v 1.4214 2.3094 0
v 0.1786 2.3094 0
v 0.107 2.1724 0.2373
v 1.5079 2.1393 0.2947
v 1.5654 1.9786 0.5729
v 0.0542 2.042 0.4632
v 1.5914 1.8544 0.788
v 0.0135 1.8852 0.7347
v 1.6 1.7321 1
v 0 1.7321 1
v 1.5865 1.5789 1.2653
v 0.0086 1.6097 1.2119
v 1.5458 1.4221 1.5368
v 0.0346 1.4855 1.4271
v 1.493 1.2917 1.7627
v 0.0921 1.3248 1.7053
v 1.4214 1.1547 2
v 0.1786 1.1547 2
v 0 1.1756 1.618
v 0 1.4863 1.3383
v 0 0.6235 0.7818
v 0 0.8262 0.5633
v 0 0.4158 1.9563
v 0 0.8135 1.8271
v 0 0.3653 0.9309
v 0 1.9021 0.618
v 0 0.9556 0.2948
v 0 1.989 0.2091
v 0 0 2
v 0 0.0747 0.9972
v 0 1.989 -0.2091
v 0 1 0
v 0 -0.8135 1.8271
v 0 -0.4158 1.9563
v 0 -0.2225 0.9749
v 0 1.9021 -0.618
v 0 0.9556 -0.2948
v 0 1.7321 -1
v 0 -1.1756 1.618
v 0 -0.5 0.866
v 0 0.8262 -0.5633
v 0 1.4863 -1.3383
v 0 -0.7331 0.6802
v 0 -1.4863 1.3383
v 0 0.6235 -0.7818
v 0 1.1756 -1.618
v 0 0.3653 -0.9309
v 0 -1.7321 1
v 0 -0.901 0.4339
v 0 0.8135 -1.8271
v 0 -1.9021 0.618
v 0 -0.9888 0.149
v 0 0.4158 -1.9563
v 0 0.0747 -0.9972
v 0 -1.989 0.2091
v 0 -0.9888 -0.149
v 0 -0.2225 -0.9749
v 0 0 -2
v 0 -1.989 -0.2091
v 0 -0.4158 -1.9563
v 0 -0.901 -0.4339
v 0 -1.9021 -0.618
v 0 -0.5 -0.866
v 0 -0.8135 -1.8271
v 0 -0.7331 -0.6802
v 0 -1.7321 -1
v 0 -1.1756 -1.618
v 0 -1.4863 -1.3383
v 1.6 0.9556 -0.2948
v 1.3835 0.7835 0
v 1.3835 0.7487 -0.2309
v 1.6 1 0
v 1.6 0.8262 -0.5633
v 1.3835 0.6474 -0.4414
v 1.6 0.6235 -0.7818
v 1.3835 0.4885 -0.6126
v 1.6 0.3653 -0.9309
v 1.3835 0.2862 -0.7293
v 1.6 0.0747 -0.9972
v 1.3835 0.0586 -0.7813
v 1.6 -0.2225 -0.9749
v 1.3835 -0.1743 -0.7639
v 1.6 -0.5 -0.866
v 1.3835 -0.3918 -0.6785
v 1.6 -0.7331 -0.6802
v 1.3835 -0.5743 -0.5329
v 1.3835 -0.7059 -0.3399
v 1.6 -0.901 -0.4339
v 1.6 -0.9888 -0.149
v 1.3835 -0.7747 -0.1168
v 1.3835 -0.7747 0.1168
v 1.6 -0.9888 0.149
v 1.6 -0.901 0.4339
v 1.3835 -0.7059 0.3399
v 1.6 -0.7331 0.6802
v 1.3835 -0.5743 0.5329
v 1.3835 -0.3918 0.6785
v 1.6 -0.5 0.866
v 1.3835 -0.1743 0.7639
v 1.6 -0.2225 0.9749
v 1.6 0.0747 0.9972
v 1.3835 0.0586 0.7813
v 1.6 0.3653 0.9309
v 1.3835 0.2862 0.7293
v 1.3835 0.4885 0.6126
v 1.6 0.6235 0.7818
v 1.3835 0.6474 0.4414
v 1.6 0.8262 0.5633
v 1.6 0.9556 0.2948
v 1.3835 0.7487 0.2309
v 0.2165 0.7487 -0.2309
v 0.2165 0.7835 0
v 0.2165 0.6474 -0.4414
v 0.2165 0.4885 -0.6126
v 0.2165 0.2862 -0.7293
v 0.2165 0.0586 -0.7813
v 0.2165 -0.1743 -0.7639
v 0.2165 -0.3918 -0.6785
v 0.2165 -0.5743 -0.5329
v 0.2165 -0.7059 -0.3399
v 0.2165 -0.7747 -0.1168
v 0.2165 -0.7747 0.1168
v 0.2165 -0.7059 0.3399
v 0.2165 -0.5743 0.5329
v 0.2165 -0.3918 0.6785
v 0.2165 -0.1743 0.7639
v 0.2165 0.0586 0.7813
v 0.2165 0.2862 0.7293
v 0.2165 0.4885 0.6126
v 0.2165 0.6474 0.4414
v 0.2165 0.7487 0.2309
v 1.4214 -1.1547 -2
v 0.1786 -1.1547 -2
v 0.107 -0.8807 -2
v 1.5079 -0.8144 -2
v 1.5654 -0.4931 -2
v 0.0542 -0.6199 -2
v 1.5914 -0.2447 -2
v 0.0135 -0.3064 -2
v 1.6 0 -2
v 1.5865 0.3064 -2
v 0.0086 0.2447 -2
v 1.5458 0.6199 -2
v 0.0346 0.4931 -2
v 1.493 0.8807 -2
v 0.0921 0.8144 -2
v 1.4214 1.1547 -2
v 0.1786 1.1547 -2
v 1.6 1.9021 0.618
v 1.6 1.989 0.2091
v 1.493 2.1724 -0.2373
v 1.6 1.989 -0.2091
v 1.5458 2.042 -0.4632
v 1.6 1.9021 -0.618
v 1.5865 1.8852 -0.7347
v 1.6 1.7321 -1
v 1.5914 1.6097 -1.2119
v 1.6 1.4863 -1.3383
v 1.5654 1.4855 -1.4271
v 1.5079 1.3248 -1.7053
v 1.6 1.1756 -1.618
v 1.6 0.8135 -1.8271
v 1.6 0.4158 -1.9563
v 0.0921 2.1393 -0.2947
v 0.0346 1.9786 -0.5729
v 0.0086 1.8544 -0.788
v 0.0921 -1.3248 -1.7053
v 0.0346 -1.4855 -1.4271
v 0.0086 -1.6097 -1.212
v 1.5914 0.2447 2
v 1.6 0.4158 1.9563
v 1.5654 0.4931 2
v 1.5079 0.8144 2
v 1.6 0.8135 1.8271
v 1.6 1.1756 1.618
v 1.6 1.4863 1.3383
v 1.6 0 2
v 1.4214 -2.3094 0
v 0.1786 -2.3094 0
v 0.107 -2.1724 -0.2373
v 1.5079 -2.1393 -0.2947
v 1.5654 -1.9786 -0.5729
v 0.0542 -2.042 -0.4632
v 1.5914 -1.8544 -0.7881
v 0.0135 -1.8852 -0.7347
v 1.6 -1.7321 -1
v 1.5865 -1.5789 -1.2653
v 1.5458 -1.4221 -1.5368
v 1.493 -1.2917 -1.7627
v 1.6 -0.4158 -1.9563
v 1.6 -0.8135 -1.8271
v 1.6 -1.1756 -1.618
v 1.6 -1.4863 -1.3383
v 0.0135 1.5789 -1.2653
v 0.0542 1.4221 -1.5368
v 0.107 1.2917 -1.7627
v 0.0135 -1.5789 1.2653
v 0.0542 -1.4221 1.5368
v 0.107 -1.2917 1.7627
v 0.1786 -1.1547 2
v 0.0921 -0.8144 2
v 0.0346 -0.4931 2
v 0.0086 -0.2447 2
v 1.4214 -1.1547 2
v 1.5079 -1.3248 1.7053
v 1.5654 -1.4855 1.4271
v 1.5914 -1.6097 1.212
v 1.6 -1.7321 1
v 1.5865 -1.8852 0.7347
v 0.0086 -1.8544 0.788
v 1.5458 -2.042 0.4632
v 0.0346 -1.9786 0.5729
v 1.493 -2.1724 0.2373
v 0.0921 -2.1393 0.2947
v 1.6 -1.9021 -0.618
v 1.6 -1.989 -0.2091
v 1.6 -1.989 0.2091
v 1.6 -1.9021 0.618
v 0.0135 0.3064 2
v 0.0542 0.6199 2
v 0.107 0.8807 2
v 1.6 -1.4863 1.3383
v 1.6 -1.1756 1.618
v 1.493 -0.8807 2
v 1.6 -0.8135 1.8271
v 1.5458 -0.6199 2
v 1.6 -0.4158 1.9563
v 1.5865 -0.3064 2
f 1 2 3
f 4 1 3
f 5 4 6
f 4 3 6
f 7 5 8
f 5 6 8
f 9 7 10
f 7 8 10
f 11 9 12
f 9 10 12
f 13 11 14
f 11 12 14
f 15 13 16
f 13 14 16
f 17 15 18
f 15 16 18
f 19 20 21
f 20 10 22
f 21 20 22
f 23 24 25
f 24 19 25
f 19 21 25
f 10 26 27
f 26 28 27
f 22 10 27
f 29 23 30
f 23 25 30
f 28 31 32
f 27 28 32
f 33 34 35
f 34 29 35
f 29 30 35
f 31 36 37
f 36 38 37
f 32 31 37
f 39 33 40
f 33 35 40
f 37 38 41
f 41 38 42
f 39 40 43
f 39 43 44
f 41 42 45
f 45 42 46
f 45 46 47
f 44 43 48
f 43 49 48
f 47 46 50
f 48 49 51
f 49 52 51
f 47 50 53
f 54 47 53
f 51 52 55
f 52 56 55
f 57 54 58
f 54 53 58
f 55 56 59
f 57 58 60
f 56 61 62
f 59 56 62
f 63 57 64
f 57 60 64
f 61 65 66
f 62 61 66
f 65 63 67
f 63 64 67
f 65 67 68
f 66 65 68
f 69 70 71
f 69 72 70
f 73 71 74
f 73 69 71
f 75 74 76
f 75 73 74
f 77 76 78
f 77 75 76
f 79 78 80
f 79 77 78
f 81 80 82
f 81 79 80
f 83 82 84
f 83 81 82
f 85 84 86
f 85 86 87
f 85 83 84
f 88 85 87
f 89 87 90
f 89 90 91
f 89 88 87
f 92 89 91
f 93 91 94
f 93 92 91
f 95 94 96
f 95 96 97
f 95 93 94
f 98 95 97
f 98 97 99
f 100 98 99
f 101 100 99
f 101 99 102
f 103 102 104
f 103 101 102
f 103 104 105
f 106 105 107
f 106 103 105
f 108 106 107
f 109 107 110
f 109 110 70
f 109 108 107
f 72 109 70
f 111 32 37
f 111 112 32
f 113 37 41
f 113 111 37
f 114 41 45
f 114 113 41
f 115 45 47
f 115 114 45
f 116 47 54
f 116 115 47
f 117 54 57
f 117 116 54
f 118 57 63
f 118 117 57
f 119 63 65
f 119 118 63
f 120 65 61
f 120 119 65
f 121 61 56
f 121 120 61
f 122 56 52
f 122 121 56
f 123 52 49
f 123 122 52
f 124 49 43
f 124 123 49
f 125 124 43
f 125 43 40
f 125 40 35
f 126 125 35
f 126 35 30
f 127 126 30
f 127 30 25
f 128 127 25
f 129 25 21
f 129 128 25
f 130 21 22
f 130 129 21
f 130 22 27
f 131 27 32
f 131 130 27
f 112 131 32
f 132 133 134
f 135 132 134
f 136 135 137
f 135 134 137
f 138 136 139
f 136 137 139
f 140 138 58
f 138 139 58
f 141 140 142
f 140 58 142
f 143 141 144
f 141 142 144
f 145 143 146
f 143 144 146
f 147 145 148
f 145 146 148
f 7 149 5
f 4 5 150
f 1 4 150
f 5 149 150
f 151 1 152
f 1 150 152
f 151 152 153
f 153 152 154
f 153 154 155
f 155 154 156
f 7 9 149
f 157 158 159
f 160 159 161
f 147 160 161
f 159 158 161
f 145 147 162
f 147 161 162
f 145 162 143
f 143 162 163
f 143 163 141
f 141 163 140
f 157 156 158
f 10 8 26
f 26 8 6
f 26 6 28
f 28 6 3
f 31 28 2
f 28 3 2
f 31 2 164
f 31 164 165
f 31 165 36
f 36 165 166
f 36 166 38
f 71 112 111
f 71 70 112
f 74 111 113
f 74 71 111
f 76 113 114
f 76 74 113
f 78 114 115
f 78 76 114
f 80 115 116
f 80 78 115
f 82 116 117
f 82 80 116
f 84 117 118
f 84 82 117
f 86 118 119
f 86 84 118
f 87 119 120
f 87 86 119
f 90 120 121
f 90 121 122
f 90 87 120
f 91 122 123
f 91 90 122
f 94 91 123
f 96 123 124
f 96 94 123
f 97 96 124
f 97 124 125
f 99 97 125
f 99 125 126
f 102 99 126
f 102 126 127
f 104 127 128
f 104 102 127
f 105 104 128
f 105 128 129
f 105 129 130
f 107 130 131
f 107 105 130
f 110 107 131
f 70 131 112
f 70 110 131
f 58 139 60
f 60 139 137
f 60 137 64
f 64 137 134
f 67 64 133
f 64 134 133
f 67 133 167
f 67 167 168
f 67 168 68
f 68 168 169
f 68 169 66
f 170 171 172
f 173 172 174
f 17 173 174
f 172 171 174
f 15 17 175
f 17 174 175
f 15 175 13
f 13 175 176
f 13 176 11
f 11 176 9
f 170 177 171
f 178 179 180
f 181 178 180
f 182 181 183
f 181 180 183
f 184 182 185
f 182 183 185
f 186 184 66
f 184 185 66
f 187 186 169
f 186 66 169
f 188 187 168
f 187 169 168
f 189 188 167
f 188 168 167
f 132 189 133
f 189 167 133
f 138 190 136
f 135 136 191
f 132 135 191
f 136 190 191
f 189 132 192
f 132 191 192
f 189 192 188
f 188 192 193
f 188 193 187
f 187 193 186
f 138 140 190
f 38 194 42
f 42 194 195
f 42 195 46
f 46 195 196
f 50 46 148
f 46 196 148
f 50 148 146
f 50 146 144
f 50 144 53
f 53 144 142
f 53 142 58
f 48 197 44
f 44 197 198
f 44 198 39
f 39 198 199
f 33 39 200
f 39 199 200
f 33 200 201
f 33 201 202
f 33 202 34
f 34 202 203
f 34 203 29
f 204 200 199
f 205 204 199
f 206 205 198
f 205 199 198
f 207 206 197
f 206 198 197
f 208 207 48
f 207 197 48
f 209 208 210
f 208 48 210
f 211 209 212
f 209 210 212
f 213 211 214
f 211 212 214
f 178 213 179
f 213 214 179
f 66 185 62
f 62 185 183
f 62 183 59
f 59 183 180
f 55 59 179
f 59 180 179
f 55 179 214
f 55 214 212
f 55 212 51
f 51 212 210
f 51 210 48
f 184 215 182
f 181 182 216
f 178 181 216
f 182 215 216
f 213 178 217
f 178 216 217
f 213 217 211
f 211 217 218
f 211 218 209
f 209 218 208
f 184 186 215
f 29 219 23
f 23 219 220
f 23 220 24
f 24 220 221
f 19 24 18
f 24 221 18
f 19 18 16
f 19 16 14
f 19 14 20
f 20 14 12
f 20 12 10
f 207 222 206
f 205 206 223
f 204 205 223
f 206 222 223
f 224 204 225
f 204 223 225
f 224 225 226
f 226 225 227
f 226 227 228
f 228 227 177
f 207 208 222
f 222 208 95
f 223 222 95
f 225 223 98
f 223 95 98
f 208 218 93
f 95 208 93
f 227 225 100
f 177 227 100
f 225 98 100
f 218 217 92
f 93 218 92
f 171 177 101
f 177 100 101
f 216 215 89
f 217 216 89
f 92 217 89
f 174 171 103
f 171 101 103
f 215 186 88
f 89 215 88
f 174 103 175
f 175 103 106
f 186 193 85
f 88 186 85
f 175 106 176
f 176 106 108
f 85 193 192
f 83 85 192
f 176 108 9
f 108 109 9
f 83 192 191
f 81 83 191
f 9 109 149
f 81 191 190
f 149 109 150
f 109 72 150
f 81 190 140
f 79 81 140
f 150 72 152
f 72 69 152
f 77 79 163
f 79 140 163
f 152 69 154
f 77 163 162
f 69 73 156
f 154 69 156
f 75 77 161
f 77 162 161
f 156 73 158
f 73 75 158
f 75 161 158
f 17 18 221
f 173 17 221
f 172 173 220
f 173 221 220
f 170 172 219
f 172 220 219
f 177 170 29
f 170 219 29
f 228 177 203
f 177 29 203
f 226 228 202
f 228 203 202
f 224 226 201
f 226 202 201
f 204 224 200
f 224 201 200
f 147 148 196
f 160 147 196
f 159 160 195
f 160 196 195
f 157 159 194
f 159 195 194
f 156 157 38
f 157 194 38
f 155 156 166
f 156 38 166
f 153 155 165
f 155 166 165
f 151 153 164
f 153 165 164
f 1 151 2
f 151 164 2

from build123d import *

# Parameters (mm, degrees)
SKETCH2_W          = 6
SKETCH2_H          = 6
CUT_EXTRUDE1_DEPTH = 1.6


with BuildPart() as part:
    # Sketch1 → Revolve1 (revolve)
    with BuildSketch(Plane.XY):
        Polygon((0, 0), (0, 2), (0.230940108, 2.4), (1.369059892, 2.4), (1.6, 2), (1.6, 0), align=None)
    revolve(axis=Axis((1.6, 0, 0), (-1, 0, 0)))

    # Sketch2 → Cut-Extrude1 (cut)
    with BuildSketch(Plane(origin=(0, 0, 0), x_dir=(0, 0, -1), z_dir=(1, 0, 0))):
        Rectangle(SKETCH2_W, SKETCH2_H)
        Polygon((-2, -1.154700538), (0, -2.309401077), (2, -1.154700538), (2, 1.154700538), (0, 2.309401077), (-2, 1.154700538), align=None, mode=Mode.SUBTRACT)
    extrude(amount=CUT_EXTRUDE1_DEPTH, mode=Mode.SUBTRACT)

    # Sketch3 → Cut-Revolve1 (revolve, cut)
    with BuildSketch(Plane.XY):
        Polygon((0, 0), (0, 1), (0.2165, 0.7835), (1.3835, 0.7835), (1.6, 1), (1.6, 0), align=None)
    revolve(axis=Axis((1.6, 0, 0), (-1, 0, 0)), mode=Mode.SUBTRACT)


solid = part.part
